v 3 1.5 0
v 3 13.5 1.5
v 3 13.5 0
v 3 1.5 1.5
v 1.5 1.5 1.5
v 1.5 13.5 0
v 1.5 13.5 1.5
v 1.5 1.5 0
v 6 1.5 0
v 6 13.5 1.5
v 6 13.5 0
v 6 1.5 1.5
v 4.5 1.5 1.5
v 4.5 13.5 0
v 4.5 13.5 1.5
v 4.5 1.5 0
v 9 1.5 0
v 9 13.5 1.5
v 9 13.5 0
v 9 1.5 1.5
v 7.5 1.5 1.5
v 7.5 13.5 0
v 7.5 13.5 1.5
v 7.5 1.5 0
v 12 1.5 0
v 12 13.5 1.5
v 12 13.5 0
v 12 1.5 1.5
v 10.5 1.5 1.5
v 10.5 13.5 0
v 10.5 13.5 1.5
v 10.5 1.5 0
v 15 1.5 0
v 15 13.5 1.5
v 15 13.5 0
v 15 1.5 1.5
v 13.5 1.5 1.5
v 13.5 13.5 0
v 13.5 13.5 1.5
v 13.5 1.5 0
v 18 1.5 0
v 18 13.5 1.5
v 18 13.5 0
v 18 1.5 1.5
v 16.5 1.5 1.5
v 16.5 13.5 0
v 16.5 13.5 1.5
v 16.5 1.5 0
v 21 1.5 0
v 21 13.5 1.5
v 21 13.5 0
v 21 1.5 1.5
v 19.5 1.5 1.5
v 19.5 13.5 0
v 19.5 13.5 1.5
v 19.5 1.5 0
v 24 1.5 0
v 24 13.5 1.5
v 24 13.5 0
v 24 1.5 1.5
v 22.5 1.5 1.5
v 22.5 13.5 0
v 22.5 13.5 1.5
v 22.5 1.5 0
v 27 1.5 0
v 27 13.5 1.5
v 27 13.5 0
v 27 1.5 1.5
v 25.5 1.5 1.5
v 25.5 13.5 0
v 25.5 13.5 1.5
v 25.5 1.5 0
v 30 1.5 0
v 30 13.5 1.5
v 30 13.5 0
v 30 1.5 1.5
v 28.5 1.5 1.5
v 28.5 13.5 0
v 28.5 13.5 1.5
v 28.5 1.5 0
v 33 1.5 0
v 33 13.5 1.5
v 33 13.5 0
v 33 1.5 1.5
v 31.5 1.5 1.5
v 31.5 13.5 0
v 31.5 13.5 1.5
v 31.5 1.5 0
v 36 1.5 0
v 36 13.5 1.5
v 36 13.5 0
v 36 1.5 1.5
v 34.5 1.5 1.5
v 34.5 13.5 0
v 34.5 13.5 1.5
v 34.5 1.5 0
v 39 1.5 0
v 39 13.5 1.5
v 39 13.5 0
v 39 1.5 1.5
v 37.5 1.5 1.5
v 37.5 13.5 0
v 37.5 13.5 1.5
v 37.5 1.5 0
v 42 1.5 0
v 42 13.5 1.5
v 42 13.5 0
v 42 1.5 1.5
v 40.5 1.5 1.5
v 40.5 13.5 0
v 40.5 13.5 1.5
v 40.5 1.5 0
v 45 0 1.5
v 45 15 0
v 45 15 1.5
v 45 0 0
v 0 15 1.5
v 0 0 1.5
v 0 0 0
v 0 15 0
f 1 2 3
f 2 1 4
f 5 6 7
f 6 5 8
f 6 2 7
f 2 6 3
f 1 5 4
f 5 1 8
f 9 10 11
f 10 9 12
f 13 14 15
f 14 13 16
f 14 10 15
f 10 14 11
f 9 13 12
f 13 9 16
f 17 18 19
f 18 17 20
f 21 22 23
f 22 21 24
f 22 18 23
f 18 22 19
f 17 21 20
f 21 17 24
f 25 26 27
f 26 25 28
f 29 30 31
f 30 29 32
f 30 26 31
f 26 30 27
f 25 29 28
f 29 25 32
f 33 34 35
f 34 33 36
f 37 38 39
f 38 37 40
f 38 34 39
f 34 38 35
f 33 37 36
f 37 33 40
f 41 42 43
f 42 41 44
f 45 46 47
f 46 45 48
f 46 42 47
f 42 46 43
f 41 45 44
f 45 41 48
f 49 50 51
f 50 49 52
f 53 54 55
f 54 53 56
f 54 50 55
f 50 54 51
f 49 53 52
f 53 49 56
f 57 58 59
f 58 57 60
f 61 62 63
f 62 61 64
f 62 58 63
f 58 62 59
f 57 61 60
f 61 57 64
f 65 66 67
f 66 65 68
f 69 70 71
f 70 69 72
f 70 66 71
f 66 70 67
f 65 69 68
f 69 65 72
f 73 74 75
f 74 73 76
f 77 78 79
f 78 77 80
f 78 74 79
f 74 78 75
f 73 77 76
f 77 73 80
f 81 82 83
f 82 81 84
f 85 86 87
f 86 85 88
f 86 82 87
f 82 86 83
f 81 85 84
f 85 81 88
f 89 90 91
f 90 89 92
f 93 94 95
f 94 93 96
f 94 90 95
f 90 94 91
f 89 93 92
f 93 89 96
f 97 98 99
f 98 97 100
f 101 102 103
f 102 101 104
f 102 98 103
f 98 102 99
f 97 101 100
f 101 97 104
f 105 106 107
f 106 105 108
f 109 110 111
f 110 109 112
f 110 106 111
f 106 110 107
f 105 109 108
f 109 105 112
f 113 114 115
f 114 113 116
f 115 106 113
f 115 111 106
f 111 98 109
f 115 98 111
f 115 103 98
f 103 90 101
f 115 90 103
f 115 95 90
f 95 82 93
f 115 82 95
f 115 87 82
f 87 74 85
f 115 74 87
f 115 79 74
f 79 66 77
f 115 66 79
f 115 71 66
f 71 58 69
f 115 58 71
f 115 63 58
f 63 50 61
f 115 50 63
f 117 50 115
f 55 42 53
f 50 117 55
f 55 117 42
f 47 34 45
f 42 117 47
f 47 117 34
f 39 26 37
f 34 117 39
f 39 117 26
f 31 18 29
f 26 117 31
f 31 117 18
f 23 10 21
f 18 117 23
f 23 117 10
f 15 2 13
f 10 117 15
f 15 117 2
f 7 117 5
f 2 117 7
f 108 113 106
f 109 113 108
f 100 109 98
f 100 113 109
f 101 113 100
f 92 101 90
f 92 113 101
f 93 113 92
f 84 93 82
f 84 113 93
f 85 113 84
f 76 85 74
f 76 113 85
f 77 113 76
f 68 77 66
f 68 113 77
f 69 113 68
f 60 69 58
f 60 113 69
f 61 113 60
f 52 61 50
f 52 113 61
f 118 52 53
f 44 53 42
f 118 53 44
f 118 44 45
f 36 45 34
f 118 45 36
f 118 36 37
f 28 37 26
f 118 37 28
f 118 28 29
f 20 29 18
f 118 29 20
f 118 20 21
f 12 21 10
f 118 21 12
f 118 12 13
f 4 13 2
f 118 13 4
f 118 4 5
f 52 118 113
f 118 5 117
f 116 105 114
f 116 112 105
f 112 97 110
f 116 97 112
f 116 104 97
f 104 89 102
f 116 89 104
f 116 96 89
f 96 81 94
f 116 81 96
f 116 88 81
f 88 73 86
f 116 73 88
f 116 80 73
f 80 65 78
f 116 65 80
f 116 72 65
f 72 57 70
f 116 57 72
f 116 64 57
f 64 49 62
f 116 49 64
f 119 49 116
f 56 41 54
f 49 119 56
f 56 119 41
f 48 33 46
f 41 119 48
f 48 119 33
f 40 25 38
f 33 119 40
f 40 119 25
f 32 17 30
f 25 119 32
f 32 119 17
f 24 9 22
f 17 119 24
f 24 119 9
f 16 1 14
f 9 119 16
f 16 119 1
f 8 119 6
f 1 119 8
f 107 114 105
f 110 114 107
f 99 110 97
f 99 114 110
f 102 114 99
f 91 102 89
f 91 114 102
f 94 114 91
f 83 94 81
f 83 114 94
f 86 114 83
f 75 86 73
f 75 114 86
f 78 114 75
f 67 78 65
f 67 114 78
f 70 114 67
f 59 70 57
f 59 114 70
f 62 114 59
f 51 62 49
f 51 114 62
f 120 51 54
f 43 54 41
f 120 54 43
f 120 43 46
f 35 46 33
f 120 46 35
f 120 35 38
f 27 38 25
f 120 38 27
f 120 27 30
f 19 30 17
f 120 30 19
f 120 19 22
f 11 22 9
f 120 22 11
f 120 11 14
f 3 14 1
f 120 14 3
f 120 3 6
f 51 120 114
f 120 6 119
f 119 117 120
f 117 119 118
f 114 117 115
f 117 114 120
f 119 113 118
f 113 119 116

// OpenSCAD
/*
    Bijenbekje
 */
 
lengte          = 45;
breedte         = 15;
dikteGrondplaat = 1.5;

bekje();

module bekje() {
    difference() {
        grondplaat();
        uitsparingen();
    }
}

//!grondplaat();
module grondplaat() {
    cube ([lengte, breedte, dikteGrondplaat]);
}

//!uitsparingen();
module uitsparingen() {
    aantal = (lengte - dikteGrondplaat) / (dikteGrondplaat * 2) - 1;
    echo(aantal = aantal);
    for (i = [0 : aantal]) {
        translate([dikteGrondplaat * (1 + i * 2)
                 , dikteGrondplaat
                 , -dikteGrondplaat]) {
            cube([dikteGrondplaat
                , breedte - 2 * dikteGrondplaat
                , 3 * dikteGrondplaat]);
        }
    }
}
